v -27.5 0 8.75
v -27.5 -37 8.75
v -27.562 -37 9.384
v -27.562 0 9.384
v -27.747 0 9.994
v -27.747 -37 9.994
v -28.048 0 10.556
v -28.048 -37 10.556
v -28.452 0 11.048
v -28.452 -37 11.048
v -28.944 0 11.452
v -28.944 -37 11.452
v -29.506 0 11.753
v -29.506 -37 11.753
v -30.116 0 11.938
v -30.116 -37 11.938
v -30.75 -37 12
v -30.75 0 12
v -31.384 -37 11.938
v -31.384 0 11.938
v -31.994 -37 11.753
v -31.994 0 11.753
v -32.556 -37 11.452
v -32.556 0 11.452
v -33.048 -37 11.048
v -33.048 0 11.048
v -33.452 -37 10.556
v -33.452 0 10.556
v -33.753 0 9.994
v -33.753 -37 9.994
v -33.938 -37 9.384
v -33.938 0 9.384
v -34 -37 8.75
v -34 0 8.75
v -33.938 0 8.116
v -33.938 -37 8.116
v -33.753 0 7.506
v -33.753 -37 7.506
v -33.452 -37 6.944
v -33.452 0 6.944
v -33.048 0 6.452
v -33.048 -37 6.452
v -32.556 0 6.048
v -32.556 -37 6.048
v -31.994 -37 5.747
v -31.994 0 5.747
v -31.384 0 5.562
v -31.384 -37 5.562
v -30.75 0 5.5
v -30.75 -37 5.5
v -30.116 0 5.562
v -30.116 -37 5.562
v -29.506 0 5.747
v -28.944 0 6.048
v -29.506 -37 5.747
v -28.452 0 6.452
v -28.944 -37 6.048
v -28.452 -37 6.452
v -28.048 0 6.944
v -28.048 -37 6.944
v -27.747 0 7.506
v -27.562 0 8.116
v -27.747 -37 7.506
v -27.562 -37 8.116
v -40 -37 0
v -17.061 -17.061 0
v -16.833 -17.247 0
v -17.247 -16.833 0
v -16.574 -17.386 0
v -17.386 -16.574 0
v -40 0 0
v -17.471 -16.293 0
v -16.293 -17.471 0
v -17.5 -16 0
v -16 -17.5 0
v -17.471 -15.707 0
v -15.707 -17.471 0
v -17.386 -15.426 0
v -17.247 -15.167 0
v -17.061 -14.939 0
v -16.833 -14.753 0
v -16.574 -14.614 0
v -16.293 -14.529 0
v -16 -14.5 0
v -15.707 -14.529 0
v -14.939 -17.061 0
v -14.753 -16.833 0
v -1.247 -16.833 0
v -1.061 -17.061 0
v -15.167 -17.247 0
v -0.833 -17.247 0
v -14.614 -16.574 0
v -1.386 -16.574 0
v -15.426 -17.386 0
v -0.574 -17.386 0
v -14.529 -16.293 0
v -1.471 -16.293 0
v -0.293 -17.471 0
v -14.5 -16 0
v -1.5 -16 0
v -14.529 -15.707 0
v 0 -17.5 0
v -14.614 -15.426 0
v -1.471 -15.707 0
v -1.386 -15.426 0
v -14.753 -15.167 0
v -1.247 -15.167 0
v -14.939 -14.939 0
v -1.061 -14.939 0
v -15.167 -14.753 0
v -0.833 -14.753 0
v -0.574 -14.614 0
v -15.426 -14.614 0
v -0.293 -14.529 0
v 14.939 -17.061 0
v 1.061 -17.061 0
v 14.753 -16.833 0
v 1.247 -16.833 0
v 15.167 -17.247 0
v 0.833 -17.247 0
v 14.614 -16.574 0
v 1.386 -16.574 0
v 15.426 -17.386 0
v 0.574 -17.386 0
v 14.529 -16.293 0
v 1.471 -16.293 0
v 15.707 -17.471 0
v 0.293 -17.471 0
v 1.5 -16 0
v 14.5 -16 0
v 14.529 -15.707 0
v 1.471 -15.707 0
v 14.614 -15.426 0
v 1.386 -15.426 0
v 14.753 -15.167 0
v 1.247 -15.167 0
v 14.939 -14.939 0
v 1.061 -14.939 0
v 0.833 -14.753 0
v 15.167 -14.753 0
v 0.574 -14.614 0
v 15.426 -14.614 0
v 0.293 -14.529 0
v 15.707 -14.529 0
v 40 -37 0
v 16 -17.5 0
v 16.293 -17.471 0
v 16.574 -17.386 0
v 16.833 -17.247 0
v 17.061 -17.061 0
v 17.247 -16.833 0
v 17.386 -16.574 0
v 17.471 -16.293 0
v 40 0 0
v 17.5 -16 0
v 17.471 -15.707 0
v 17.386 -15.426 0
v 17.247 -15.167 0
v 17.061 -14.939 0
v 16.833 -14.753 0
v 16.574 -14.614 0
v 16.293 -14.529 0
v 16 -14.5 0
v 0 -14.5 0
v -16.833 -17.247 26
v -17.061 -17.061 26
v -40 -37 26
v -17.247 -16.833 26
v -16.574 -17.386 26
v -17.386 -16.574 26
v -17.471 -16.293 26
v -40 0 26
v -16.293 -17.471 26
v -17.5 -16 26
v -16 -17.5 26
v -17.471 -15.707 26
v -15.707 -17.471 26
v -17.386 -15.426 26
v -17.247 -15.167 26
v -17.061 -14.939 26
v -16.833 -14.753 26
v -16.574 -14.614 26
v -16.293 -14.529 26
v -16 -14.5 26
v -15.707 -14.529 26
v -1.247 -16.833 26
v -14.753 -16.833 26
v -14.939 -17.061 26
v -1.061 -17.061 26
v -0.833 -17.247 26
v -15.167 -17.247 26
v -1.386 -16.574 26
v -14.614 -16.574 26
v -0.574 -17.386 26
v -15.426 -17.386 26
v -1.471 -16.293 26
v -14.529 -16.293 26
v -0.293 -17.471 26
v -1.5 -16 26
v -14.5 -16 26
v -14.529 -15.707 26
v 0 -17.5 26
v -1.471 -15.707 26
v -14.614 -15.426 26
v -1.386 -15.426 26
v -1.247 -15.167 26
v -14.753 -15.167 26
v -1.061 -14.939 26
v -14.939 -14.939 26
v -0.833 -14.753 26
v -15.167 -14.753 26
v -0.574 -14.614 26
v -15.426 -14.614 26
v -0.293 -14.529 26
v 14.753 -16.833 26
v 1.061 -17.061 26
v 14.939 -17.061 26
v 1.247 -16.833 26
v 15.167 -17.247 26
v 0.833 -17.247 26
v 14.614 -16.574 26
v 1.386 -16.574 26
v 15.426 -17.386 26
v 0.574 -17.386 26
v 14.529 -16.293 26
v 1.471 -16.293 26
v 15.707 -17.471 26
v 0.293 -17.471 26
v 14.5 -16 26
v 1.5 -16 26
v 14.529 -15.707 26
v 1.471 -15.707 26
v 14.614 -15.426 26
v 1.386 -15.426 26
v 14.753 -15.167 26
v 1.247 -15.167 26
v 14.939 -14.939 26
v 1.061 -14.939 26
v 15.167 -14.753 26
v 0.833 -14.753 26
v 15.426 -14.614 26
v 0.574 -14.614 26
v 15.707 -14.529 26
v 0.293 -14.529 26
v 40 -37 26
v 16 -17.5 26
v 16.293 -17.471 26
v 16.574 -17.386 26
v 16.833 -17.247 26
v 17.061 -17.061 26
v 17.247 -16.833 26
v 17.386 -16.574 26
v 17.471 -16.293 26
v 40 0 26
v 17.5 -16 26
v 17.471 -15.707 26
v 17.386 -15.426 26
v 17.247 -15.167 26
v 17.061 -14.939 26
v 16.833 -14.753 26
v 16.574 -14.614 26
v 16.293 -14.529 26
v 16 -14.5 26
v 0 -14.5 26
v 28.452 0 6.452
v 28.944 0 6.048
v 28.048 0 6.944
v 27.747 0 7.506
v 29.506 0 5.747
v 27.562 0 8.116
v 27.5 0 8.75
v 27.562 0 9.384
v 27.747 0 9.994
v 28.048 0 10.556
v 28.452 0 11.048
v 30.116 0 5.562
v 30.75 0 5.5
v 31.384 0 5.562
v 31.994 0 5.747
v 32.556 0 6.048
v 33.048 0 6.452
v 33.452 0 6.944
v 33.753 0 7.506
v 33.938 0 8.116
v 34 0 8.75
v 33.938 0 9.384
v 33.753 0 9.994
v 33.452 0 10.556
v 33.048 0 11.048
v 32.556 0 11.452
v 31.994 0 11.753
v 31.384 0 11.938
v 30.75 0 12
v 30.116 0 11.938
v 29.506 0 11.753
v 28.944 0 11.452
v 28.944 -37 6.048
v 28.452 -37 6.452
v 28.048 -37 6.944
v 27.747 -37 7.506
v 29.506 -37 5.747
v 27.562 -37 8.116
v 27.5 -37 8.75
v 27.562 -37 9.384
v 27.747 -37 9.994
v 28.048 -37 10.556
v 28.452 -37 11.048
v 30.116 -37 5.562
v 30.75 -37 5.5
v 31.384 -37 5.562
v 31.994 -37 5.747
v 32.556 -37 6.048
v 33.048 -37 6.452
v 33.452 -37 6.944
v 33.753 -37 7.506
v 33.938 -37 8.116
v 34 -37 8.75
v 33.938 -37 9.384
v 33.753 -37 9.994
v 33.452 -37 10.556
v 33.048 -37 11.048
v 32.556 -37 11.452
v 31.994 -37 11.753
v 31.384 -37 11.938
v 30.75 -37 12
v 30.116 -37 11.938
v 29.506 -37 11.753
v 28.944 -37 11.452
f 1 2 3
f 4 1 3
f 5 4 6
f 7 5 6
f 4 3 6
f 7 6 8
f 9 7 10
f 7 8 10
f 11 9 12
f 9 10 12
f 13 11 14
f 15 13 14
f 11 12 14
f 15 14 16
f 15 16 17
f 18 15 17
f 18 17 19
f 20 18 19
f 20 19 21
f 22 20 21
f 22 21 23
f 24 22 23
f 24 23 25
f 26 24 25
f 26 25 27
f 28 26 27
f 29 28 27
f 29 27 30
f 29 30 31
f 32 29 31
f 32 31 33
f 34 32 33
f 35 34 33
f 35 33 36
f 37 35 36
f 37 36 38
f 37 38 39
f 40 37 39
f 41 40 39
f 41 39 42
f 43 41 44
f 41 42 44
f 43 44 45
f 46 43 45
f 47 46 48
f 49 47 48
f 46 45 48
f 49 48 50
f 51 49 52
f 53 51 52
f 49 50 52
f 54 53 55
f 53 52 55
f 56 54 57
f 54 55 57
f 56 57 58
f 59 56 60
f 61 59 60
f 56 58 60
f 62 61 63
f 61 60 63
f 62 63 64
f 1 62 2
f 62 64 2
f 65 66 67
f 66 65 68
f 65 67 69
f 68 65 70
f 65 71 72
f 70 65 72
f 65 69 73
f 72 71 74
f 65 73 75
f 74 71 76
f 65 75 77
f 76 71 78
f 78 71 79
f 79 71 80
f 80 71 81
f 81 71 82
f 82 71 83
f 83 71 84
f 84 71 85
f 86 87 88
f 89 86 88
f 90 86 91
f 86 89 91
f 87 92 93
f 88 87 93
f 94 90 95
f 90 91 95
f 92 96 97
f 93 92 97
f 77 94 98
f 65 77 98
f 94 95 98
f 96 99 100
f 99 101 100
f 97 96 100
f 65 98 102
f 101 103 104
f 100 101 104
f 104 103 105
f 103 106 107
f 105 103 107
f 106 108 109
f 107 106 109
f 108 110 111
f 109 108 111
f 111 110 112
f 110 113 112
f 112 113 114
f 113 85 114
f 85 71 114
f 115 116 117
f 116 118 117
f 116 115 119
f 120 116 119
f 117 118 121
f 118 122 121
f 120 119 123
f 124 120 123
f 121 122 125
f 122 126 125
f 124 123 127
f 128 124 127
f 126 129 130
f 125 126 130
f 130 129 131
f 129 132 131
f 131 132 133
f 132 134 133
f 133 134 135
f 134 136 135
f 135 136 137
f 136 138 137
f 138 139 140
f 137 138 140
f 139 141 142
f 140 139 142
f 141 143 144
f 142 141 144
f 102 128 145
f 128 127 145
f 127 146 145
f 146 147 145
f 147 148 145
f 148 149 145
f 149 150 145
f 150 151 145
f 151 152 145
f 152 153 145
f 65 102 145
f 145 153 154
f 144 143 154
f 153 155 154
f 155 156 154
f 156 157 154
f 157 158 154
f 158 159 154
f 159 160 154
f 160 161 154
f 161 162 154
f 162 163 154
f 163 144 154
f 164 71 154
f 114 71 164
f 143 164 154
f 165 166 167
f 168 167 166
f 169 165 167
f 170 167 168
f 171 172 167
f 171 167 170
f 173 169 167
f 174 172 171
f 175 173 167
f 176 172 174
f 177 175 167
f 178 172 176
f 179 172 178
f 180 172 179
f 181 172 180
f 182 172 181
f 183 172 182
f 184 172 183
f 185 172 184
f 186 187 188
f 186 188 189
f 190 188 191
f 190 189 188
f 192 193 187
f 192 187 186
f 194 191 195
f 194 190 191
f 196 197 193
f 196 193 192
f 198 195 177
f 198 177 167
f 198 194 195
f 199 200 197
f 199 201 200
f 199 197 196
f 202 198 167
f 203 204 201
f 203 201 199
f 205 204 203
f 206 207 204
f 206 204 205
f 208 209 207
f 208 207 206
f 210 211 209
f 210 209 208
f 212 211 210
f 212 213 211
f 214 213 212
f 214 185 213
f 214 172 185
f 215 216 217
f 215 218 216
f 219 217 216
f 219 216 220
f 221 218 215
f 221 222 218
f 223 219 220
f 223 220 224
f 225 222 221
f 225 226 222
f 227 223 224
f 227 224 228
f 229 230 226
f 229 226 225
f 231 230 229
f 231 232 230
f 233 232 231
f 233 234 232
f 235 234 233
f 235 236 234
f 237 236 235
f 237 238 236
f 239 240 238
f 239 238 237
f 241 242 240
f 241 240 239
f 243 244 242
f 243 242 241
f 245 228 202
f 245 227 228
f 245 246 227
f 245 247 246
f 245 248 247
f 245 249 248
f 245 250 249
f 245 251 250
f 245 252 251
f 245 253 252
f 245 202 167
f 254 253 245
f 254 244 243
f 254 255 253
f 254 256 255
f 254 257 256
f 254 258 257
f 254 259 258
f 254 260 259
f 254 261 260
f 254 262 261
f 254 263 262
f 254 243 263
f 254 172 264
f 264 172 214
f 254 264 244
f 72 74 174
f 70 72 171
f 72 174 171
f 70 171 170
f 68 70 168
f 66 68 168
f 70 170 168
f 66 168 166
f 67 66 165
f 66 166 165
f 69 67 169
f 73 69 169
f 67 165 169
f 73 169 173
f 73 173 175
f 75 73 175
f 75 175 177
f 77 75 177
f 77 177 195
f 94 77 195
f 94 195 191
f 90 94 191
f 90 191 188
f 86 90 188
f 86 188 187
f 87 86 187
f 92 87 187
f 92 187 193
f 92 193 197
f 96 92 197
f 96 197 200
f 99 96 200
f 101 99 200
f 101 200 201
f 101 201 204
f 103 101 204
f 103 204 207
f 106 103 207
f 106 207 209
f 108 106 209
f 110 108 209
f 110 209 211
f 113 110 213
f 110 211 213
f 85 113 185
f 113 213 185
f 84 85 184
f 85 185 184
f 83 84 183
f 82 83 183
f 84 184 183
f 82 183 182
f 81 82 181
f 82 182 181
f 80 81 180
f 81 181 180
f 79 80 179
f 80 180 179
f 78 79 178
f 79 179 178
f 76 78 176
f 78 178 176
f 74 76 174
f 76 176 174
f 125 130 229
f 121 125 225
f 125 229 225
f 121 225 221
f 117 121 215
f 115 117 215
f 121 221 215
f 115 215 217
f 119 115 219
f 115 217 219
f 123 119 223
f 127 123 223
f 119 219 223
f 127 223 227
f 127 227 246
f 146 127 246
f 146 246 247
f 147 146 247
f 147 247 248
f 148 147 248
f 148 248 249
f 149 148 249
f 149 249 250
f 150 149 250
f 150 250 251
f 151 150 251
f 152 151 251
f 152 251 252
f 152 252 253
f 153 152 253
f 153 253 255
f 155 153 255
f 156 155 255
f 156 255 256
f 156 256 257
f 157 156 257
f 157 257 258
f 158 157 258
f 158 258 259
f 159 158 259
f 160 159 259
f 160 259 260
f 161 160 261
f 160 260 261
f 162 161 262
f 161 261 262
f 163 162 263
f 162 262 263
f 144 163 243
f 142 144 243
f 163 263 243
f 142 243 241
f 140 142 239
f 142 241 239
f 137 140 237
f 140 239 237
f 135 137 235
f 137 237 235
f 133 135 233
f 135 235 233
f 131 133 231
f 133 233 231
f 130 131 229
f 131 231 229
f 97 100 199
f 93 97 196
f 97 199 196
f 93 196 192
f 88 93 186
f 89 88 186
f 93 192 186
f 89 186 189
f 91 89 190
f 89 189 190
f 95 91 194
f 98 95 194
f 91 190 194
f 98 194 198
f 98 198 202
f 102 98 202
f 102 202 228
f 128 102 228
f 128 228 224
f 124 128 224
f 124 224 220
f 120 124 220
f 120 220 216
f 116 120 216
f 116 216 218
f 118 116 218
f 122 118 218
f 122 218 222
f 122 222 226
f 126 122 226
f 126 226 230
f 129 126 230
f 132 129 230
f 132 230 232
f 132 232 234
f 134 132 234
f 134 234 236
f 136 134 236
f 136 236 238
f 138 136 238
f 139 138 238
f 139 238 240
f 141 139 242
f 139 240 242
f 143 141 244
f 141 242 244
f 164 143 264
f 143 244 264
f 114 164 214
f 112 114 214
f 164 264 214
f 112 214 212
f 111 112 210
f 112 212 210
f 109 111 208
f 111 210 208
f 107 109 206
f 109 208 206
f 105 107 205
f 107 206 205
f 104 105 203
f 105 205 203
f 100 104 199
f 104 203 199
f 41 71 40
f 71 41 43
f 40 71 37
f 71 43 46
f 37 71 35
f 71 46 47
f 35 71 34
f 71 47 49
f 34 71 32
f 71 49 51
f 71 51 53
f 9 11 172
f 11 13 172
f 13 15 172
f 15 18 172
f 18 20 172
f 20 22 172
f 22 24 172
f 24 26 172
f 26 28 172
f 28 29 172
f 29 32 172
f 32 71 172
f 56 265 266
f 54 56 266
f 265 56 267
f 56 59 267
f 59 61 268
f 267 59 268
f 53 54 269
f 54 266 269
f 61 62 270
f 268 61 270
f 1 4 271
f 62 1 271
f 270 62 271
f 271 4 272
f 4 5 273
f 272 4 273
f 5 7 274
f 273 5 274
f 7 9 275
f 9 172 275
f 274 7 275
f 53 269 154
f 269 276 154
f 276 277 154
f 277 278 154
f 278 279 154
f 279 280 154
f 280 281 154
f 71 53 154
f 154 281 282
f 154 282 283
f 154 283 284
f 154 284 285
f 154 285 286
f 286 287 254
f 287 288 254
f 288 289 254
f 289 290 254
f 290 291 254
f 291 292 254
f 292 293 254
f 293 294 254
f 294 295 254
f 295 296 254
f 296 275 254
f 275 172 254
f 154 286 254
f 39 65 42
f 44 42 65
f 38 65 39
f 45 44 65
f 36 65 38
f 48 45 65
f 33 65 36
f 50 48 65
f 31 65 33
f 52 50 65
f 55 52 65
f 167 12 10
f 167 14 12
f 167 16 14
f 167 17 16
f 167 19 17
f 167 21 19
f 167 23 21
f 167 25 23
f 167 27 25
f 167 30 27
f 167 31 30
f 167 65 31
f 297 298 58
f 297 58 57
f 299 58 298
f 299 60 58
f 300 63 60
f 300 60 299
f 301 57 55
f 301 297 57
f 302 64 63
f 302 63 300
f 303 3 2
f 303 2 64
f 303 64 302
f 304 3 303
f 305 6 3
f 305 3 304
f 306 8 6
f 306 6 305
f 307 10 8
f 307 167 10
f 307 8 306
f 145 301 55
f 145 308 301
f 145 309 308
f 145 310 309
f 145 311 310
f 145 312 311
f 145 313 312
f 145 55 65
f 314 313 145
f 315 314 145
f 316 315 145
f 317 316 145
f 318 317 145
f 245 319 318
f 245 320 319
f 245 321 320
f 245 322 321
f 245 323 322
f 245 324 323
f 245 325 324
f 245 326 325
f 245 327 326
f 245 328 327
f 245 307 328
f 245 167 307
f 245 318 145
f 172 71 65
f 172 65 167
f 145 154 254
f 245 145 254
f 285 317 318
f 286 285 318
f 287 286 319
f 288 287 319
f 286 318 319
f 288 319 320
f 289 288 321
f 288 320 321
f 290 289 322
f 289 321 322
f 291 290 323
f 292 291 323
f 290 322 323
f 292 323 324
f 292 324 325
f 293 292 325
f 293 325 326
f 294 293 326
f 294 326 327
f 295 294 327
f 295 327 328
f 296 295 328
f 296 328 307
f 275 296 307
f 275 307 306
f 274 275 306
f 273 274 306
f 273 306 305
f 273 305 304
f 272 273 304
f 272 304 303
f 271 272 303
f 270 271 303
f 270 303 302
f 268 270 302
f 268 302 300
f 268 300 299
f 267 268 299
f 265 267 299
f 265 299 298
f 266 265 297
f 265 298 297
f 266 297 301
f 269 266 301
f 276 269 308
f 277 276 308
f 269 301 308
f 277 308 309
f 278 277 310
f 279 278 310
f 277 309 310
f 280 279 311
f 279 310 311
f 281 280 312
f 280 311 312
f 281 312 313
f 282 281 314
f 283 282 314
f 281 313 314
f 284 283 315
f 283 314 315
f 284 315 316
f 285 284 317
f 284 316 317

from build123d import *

# Parameters (mm, degrees)
SKETCH_W        = 80
SKETCH_H        = 26
PAD_DEPTH       = 37
SKETCH001_R     = 3.25
POCKET_DEPTH    = 37.501
SKETCH002_R     = 1.5
POCKET001_DEPTH = 26.001


with BuildPart() as part:
    # Sketch → Pad (new body)
    with BuildSketch(Plane.XZ):
        with Locations((0, 13)):
            Rectangle(SKETCH_W, SKETCH_H)
    extrude(amount=PAD_DEPTH)

    # Sketch001 → Pocket (cut, through all)
    with BuildSketch(Plane.XZ.offset(37.5)):
        with Locations((-30.75, 8.75)):
            Circle(SKETCH001_R)
        with Locations((30.75, 8.75)):
            Circle(SKETCH001_R)
    extrude(amount=-POCKET_DEPTH, mode=Mode.SUBTRACT)

    # Sketch002 (on Face6 of Pocket) → Pocket001 (cut, through all)
    with BuildSketch(Plane(origin=(0, 0, 26), x_dir=(-1, 0, 0), z_dir=(0, 0, 1))):
        with Locations((-16, 16)):
            Circle(SKETCH002_R)
        with Locations((16, 16)):
            Circle(SKETCH002_R)
        with Locations((0, 16)):
            Circle(SKETCH002_R)
    extrude(amount=-POCKET001_DEPTH, mode=Mode.SUBTRACT)


solid = part.part
